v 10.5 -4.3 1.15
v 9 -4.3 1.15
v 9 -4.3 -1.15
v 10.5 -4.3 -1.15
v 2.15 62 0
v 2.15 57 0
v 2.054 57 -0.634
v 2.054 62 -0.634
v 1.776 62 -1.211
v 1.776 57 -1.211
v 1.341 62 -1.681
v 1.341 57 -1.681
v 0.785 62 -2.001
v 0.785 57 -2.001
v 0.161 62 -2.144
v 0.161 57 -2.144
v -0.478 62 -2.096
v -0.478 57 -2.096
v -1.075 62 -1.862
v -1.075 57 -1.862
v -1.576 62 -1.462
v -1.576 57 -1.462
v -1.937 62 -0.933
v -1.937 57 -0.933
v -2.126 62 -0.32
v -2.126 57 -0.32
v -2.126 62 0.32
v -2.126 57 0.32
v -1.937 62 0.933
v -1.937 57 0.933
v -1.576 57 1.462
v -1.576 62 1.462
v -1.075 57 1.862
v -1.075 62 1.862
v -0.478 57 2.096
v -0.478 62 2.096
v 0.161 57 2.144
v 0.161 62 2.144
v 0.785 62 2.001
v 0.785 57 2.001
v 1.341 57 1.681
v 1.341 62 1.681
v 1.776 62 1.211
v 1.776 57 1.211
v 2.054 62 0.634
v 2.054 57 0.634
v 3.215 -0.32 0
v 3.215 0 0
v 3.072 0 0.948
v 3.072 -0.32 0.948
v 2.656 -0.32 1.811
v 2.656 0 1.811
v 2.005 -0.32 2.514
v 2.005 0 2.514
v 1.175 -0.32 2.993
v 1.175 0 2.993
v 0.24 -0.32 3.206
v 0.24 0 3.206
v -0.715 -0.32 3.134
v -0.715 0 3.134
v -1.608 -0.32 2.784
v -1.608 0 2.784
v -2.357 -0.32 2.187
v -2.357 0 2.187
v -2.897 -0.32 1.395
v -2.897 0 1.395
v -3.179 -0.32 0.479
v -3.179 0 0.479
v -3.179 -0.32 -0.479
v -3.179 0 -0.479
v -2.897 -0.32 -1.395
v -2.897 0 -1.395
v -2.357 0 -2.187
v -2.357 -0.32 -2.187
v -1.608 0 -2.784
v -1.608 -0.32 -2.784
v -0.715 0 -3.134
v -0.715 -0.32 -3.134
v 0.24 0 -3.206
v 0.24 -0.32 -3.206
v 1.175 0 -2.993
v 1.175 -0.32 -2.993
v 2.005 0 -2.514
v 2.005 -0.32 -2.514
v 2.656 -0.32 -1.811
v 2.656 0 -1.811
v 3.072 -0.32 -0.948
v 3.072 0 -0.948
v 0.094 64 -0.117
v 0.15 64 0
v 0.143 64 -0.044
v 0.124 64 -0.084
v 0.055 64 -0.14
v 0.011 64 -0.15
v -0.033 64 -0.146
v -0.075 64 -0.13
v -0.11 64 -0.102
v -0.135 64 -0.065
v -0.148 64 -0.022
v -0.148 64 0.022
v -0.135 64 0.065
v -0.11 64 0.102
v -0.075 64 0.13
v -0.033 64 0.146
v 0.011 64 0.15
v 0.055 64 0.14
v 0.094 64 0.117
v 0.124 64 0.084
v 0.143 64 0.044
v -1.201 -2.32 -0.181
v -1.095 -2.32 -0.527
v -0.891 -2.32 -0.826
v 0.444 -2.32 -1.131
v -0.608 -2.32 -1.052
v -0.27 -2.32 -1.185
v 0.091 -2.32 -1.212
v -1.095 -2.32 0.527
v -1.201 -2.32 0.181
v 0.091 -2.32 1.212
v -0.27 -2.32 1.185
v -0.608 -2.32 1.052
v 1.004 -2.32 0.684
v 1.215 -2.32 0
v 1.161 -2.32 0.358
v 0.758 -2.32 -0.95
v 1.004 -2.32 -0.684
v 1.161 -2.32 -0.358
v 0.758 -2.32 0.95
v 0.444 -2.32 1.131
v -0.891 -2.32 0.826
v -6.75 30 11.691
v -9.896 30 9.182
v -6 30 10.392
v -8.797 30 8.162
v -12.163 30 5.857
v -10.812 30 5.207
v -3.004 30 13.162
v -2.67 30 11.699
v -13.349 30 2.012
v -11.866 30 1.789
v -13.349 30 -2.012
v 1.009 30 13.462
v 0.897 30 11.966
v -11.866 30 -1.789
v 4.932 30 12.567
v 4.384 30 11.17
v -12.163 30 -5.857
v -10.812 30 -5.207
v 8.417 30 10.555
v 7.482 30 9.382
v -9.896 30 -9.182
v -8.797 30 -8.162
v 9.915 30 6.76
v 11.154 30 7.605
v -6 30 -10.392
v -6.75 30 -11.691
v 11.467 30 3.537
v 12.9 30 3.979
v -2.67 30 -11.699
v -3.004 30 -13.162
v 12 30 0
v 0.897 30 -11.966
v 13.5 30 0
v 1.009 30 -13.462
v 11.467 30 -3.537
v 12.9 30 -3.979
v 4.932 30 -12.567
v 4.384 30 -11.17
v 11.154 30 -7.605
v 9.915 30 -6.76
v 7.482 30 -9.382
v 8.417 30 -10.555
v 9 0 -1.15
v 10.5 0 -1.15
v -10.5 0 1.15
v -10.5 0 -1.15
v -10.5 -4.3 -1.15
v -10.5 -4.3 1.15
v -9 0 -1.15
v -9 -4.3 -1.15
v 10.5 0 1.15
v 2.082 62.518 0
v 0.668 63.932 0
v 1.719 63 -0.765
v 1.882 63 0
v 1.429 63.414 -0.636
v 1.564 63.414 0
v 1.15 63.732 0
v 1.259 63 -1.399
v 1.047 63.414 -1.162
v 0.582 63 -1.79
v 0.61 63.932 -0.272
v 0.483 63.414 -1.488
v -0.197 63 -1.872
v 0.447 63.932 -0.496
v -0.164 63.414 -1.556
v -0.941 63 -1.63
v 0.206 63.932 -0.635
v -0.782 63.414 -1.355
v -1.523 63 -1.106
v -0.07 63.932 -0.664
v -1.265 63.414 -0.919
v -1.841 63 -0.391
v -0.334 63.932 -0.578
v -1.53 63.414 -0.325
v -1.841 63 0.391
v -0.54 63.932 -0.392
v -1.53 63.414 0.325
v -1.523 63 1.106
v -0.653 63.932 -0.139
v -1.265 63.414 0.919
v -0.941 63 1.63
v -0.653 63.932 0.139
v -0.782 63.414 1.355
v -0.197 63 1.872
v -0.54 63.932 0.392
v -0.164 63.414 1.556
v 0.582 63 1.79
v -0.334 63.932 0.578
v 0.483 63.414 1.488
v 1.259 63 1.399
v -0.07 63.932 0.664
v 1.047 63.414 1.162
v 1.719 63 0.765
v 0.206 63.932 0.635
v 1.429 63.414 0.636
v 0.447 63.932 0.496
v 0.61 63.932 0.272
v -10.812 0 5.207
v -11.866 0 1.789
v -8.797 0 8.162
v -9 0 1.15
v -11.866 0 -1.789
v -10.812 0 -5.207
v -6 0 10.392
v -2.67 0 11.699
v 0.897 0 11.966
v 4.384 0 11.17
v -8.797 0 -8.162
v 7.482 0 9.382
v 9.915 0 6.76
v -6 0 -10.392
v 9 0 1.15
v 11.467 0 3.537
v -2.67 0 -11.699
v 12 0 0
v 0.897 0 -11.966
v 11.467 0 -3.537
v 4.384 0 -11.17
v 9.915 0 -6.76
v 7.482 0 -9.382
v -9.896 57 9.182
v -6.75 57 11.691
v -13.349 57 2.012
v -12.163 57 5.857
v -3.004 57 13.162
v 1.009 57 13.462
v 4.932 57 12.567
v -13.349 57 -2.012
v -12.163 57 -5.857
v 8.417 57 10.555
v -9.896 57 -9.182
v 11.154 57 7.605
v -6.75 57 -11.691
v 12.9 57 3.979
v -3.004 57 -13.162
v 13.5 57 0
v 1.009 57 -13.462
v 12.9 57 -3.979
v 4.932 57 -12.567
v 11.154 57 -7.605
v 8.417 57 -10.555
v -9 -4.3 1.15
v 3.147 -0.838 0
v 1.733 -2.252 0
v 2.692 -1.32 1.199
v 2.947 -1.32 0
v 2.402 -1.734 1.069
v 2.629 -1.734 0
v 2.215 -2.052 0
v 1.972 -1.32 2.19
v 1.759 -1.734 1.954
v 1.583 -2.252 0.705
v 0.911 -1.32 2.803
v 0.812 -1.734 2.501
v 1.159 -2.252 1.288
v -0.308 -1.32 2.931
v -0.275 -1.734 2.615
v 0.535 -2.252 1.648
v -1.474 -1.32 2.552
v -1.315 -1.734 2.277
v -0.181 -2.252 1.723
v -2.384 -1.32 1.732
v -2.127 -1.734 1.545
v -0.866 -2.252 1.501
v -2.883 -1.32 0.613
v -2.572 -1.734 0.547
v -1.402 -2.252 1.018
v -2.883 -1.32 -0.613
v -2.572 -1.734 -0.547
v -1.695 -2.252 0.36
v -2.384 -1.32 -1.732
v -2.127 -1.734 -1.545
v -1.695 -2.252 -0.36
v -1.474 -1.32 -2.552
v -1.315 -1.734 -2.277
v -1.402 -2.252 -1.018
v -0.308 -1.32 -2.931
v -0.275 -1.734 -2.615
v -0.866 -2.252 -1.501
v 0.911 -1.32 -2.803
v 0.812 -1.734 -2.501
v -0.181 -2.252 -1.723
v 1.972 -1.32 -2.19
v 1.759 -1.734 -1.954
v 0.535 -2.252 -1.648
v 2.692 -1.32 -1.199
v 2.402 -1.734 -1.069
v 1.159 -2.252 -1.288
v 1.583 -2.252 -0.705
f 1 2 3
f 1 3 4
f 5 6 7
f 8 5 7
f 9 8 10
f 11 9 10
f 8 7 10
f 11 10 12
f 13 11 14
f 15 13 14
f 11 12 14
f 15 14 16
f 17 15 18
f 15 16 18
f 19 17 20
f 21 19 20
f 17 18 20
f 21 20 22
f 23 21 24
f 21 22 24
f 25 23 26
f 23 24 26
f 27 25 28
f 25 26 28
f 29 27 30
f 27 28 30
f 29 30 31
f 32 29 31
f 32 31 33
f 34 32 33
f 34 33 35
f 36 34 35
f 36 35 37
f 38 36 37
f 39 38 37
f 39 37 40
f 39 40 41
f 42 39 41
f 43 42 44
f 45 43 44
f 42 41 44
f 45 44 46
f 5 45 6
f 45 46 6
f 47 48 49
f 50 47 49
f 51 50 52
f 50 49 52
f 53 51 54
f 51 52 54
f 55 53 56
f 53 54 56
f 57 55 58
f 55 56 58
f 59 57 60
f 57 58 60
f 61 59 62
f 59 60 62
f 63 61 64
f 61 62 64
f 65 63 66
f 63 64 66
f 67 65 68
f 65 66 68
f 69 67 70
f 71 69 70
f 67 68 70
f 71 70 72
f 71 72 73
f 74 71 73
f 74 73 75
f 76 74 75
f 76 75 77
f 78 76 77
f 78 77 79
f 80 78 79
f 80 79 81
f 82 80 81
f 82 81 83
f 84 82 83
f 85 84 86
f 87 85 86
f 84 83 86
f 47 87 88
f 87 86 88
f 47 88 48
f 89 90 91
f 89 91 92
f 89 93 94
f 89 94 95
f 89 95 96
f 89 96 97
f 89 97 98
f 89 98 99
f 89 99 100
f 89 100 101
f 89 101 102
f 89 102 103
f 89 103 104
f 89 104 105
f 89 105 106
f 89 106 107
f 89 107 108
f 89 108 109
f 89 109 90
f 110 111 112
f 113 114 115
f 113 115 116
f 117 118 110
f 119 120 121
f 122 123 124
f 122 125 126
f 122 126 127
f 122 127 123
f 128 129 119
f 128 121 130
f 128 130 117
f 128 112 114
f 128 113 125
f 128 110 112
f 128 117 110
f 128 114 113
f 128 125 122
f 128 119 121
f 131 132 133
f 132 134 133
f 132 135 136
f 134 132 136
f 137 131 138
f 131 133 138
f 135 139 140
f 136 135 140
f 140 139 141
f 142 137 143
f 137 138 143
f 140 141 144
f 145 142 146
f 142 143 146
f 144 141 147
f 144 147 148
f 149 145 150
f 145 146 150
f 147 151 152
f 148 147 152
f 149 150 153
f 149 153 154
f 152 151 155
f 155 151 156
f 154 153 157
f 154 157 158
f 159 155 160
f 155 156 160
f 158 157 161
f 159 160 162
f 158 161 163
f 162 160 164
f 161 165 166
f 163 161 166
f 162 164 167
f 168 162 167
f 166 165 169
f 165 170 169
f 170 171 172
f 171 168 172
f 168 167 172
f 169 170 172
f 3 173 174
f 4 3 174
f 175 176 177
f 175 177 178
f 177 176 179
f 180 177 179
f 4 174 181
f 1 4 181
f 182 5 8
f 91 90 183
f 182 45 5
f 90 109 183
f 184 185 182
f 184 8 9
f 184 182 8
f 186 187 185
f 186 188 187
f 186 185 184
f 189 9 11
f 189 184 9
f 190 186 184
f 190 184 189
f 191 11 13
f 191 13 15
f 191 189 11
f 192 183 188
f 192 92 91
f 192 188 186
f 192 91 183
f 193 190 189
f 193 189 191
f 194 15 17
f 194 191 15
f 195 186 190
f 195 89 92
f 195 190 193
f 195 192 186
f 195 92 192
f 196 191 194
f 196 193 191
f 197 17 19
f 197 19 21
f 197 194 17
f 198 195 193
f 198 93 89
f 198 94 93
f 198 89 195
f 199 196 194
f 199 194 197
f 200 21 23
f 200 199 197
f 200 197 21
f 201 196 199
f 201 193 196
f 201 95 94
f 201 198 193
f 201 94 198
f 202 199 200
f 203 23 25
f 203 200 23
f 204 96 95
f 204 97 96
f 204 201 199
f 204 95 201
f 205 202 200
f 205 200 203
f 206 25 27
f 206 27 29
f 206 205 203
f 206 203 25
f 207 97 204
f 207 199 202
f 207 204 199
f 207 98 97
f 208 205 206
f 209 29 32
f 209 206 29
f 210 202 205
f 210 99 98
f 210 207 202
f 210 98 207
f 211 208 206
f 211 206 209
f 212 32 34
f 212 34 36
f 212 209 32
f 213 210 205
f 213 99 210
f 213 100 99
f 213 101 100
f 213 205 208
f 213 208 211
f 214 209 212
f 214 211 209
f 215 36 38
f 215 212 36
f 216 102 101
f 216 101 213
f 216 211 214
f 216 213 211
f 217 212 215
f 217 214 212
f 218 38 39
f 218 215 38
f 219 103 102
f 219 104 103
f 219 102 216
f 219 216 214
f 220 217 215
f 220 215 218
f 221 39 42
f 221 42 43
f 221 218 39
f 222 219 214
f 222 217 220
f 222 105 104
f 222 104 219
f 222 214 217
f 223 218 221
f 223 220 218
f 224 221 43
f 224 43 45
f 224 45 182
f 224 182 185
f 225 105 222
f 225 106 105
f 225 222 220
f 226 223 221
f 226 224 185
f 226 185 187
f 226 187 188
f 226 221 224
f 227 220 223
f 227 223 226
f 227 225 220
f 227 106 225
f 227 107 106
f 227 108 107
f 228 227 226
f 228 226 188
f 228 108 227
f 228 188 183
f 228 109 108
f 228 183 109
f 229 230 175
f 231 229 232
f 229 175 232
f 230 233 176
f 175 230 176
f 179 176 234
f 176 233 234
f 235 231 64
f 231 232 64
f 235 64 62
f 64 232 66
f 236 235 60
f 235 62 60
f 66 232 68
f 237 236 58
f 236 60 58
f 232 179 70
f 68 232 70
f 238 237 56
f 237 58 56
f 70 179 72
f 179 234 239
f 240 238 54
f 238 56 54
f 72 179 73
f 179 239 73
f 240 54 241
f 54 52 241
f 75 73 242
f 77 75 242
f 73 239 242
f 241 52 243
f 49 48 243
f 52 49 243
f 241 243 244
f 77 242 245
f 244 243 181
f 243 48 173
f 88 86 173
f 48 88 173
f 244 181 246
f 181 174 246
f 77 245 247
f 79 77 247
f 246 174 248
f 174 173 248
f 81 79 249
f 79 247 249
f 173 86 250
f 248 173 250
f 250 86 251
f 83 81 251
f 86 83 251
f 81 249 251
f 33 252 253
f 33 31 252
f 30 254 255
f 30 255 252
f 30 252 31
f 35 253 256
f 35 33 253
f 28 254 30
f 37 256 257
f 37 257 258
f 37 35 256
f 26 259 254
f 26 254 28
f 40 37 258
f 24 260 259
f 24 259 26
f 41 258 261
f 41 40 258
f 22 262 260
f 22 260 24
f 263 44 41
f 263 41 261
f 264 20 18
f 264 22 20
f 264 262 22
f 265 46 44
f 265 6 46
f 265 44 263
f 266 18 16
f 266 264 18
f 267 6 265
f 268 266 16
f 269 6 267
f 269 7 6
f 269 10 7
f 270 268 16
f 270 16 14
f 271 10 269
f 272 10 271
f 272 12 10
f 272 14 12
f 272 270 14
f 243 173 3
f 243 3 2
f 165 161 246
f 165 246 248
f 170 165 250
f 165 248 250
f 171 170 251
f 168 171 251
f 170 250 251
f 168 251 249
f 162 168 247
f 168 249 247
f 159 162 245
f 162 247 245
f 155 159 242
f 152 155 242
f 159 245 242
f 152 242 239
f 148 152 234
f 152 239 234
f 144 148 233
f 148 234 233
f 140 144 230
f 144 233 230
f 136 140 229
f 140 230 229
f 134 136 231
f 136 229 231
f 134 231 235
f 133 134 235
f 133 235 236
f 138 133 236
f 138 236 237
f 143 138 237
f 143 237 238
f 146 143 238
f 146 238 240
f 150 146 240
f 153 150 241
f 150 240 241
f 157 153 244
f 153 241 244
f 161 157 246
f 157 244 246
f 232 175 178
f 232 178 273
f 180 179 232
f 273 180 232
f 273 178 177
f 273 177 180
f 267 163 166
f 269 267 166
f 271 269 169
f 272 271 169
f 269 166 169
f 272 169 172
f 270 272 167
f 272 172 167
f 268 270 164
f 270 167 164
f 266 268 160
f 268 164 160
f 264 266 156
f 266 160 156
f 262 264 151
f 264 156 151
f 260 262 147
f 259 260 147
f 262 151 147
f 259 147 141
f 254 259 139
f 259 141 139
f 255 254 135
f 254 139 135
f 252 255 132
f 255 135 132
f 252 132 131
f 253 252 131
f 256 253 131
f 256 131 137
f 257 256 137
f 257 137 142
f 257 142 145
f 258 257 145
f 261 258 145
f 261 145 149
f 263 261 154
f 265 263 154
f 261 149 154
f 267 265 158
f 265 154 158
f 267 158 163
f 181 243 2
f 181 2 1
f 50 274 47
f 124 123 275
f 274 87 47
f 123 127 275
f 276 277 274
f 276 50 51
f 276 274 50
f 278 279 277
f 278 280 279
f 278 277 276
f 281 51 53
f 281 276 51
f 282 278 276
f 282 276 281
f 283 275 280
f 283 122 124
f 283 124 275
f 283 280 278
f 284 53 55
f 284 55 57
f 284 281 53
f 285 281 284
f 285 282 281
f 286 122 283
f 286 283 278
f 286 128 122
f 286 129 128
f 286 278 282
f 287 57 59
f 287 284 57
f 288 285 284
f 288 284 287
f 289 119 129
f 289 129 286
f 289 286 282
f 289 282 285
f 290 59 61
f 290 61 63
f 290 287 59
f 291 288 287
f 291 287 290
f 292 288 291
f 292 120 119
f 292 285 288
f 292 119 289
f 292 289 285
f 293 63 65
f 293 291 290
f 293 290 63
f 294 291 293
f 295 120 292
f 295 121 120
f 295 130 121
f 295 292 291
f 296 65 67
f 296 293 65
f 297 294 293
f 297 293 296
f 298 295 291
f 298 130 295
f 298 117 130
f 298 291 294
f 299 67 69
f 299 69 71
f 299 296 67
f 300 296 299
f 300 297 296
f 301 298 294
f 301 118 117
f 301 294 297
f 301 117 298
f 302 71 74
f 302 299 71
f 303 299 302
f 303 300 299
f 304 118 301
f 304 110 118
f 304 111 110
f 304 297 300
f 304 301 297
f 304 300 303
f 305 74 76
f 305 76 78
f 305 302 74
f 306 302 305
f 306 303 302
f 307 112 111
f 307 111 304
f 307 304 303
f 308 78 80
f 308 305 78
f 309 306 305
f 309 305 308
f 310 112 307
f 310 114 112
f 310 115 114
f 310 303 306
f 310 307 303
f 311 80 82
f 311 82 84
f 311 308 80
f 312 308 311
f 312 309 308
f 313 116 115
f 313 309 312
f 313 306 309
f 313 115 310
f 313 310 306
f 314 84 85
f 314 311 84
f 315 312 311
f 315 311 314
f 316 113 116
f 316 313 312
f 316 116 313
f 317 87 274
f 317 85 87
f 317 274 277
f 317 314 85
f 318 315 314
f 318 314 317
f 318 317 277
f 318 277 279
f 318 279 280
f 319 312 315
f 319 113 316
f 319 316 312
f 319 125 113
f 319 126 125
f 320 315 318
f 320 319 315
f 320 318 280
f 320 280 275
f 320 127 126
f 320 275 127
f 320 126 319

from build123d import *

# Parameters (mm, degrees)
SKETCH1_R           = 12
BOSS_EXTRUDE1_DEPTH = 30
SKETCH2_R           = 13.5
BOSS_EXTRUDE2_DEPTH = 27
SKETCH3_R           = 2.15
BOSS_EXTRUDE3_DEPTH = 7
FILLET1_R           = 2
SKETCH4_R           = 3.215
BOSS_EXTRUDE4_DEPTH = 2.32
FILLET2_R           = 2
SKETCH5_W           = 1.5
SKETCH5_H           = 2.3
BOSS_EXTRUDE5_DEPTH = 4.3


with BuildPart() as part:
    # Sketch1 → Boss-Extrude1 (new body)
    with BuildSketch(Plane(origin=(0, 0, 0), x_dir=(1, 0, 0), z_dir=(0, 1, 0))):
        Circle(SKETCH1_R)
    extrude(amount=BOSS_EXTRUDE1_DEPTH)

    # Sketch2 → Boss-Extrude2 (add)
    with BuildSketch(Plane(origin=(0, 30, 0), x_dir=(1, 0, 0), z_dir=(0, 1, 0))):
        Circle(SKETCH2_R)
    extrude(amount=BOSS_EXTRUDE2_DEPTH)

    # Sketch3 → Boss-Extrude3 (add)
    with BuildSketch(Plane(origin=(0, 57, 0), x_dir=(1, 0, 0), z_dir=(0, 1, 0))):
        Circle(SKETCH3_R)
    extrude(amount=BOSS_EXTRUDE3_DEPTH)

    # Fillet1
    fillet1_edges = [part.edges().sort_by_distance(p)[0] for p in [
        (-2.15, 64, 0),
    ]]
    fillet(fillet1_edges, radius=FILLET1_R)

    # Sketch4 → Boss-Extrude4 (add)
    with BuildSketch(Plane.XZ):
        Circle(SKETCH4_R)
    extrude(amount=BOSS_EXTRUDE4_DEPTH)

    # Fillet2
    fillet2_edges = [part.edges().sort_by_distance(p)[0] for p in [
        (-3.215, -2.32, 0),
    ]]
    fillet(fillet2_edges, radius=FILLET2_R)

    # Sketch5 → Boss-Extrude5 (add)
    with BuildSketch(Plane.XZ):
        with Locations((9.75, 0)):
            Rectangle(SKETCH5_W, SKETCH5_H)
        with Locations((-9.75, 0)):
            Rectangle(SKETCH5_W, SKETCH5_H)
    extrude(amount=BOSS_EXTRUDE5_DEPTH)


solid = part.part
